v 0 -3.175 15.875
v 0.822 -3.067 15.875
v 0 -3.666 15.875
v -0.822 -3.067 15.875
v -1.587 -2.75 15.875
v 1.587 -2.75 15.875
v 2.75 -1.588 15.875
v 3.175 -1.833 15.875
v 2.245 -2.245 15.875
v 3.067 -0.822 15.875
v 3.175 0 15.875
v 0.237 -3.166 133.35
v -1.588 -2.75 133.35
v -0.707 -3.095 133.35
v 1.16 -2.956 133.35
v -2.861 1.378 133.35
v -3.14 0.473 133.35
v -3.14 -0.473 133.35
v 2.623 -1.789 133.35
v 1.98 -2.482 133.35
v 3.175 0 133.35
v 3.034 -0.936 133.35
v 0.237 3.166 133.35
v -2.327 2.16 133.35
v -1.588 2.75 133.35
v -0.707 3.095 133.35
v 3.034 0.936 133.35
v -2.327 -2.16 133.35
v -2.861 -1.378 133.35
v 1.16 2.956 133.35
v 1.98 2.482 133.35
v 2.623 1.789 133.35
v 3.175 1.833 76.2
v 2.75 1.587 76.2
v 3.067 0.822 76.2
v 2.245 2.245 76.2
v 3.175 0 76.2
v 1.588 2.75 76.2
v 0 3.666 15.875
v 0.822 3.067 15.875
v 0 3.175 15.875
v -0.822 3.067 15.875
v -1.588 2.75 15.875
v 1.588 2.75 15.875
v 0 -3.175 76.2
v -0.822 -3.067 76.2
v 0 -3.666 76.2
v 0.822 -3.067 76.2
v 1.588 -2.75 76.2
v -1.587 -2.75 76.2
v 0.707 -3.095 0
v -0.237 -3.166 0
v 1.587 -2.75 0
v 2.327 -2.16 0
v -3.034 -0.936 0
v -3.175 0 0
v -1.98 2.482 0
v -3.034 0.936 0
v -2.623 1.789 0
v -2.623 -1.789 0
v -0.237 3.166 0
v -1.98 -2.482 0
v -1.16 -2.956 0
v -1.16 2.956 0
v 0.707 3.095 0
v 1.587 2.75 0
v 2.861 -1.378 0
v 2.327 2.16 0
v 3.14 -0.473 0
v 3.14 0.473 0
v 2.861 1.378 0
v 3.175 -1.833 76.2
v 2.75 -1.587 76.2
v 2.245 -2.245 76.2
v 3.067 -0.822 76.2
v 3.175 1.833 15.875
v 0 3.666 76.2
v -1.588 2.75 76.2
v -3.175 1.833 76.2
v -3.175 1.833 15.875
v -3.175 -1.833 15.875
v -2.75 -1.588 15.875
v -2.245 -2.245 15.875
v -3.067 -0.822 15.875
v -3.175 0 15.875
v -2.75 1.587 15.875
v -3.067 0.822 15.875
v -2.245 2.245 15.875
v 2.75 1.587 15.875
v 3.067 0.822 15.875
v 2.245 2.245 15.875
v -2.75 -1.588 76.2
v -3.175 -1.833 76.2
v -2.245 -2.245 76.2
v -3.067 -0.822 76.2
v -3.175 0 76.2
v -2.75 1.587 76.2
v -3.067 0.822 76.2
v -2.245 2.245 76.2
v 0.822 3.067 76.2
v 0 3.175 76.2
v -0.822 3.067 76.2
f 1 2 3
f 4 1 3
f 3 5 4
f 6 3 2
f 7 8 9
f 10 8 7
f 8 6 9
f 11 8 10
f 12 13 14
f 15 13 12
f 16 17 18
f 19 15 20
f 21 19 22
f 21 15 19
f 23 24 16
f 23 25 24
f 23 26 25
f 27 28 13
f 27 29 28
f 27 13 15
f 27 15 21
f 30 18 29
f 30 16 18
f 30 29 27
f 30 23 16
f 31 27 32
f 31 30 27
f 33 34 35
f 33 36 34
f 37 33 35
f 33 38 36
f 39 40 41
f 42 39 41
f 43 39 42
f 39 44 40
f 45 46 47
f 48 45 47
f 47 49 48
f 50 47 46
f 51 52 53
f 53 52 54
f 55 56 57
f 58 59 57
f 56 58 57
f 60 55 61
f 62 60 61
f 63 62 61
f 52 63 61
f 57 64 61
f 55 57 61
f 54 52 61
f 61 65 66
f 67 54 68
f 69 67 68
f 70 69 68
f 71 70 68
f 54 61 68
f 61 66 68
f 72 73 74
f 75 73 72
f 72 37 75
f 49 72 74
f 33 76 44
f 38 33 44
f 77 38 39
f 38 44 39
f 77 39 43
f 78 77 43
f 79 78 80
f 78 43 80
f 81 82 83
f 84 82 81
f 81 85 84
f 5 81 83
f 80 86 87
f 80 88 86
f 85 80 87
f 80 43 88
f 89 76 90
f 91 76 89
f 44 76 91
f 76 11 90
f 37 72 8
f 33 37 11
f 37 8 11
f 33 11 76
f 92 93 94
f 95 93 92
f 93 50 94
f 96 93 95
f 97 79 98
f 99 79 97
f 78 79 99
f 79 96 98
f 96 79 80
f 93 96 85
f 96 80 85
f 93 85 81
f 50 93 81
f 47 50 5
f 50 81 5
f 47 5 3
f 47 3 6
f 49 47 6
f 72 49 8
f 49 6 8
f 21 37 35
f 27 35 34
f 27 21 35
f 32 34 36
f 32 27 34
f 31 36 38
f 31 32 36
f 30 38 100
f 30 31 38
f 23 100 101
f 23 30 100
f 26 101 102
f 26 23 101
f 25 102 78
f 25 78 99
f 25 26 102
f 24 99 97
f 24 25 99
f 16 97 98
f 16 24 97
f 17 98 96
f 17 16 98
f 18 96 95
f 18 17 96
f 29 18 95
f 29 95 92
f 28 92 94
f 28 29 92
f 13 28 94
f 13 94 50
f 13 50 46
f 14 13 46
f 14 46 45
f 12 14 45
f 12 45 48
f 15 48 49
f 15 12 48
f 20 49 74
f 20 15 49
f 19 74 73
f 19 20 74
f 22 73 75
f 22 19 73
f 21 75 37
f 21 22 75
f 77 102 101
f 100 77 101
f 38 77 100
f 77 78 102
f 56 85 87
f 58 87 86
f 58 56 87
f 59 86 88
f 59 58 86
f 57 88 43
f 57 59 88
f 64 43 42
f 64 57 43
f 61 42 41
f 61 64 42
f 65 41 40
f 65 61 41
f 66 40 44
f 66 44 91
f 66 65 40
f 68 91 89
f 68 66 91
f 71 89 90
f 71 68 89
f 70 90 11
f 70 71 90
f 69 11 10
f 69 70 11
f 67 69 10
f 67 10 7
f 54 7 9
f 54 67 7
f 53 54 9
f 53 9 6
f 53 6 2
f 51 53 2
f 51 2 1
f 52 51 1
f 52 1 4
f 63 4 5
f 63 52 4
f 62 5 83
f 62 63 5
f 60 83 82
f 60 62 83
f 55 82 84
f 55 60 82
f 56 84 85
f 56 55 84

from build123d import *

# Parameters (mm, degrees)
BOSS_EXTRUDE1_DEPTH = 133.35
SKETCH3_OUTSIDE_W   = 35.09
SKETCH3_OUTSIDE_H   = 36.072
SKETCH3_OUTSIDE_R   = 3.175
CUT_EXTRUDE1_DEPTH  = 57.15
SKETCH4_OUTSIDE_W   = 35.09
SKETCH4_OUTSIDE_H   = 36.072
SKETCH4_OUTSIDE_R   = 3.175
CUT_EXTRUDE2_DEPTH  = 15.875


with BuildPart() as part:
    # Sketch2 → Boss-Extrude1 (new body)
    with BuildSketch(Plane.XY):
        Polygon((0, 3.666174209), (-3.175, 1.833087105), (-3.175, -1.833087105), (0, -3.666174209), (3.175, -1.833087105), (3.175, 1.833087105), align=None)
    extrude(amount=BOSS_EXTRUDE1_DEPTH)

    # Sketch3 outside → Cut-Extrude1 (cut)
    with BuildSketch(Plane.XY.offset(133.35)):
        Rectangle(SKETCH3_OUTSIDE_W, SKETCH3_OUTSIDE_H)
        Circle(SKETCH3_OUTSIDE_R, mode=Mode.SUBTRACT)
    extrude(amount=-CUT_EXTRUDE1_DEPTH, mode=Mode.SUBTRACT)

    # Sketch4 outside → Cut-Extrude2 (cut)
    with BuildSketch(Plane(origin=(0, 0, 0), x_dir=(-1, 0, 0), z_dir=(0, 0, -1))):
        Rectangle(SKETCH4_OUTSIDE_W, SKETCH4_OUTSIDE_H)
        Circle(SKETCH4_OUTSIDE_R, mode=Mode.SUBTRACT)
    extrude(amount=-CUT_EXTRUDE2_DEPTH, mode=Mode.SUBTRACT)


solid = part.part
